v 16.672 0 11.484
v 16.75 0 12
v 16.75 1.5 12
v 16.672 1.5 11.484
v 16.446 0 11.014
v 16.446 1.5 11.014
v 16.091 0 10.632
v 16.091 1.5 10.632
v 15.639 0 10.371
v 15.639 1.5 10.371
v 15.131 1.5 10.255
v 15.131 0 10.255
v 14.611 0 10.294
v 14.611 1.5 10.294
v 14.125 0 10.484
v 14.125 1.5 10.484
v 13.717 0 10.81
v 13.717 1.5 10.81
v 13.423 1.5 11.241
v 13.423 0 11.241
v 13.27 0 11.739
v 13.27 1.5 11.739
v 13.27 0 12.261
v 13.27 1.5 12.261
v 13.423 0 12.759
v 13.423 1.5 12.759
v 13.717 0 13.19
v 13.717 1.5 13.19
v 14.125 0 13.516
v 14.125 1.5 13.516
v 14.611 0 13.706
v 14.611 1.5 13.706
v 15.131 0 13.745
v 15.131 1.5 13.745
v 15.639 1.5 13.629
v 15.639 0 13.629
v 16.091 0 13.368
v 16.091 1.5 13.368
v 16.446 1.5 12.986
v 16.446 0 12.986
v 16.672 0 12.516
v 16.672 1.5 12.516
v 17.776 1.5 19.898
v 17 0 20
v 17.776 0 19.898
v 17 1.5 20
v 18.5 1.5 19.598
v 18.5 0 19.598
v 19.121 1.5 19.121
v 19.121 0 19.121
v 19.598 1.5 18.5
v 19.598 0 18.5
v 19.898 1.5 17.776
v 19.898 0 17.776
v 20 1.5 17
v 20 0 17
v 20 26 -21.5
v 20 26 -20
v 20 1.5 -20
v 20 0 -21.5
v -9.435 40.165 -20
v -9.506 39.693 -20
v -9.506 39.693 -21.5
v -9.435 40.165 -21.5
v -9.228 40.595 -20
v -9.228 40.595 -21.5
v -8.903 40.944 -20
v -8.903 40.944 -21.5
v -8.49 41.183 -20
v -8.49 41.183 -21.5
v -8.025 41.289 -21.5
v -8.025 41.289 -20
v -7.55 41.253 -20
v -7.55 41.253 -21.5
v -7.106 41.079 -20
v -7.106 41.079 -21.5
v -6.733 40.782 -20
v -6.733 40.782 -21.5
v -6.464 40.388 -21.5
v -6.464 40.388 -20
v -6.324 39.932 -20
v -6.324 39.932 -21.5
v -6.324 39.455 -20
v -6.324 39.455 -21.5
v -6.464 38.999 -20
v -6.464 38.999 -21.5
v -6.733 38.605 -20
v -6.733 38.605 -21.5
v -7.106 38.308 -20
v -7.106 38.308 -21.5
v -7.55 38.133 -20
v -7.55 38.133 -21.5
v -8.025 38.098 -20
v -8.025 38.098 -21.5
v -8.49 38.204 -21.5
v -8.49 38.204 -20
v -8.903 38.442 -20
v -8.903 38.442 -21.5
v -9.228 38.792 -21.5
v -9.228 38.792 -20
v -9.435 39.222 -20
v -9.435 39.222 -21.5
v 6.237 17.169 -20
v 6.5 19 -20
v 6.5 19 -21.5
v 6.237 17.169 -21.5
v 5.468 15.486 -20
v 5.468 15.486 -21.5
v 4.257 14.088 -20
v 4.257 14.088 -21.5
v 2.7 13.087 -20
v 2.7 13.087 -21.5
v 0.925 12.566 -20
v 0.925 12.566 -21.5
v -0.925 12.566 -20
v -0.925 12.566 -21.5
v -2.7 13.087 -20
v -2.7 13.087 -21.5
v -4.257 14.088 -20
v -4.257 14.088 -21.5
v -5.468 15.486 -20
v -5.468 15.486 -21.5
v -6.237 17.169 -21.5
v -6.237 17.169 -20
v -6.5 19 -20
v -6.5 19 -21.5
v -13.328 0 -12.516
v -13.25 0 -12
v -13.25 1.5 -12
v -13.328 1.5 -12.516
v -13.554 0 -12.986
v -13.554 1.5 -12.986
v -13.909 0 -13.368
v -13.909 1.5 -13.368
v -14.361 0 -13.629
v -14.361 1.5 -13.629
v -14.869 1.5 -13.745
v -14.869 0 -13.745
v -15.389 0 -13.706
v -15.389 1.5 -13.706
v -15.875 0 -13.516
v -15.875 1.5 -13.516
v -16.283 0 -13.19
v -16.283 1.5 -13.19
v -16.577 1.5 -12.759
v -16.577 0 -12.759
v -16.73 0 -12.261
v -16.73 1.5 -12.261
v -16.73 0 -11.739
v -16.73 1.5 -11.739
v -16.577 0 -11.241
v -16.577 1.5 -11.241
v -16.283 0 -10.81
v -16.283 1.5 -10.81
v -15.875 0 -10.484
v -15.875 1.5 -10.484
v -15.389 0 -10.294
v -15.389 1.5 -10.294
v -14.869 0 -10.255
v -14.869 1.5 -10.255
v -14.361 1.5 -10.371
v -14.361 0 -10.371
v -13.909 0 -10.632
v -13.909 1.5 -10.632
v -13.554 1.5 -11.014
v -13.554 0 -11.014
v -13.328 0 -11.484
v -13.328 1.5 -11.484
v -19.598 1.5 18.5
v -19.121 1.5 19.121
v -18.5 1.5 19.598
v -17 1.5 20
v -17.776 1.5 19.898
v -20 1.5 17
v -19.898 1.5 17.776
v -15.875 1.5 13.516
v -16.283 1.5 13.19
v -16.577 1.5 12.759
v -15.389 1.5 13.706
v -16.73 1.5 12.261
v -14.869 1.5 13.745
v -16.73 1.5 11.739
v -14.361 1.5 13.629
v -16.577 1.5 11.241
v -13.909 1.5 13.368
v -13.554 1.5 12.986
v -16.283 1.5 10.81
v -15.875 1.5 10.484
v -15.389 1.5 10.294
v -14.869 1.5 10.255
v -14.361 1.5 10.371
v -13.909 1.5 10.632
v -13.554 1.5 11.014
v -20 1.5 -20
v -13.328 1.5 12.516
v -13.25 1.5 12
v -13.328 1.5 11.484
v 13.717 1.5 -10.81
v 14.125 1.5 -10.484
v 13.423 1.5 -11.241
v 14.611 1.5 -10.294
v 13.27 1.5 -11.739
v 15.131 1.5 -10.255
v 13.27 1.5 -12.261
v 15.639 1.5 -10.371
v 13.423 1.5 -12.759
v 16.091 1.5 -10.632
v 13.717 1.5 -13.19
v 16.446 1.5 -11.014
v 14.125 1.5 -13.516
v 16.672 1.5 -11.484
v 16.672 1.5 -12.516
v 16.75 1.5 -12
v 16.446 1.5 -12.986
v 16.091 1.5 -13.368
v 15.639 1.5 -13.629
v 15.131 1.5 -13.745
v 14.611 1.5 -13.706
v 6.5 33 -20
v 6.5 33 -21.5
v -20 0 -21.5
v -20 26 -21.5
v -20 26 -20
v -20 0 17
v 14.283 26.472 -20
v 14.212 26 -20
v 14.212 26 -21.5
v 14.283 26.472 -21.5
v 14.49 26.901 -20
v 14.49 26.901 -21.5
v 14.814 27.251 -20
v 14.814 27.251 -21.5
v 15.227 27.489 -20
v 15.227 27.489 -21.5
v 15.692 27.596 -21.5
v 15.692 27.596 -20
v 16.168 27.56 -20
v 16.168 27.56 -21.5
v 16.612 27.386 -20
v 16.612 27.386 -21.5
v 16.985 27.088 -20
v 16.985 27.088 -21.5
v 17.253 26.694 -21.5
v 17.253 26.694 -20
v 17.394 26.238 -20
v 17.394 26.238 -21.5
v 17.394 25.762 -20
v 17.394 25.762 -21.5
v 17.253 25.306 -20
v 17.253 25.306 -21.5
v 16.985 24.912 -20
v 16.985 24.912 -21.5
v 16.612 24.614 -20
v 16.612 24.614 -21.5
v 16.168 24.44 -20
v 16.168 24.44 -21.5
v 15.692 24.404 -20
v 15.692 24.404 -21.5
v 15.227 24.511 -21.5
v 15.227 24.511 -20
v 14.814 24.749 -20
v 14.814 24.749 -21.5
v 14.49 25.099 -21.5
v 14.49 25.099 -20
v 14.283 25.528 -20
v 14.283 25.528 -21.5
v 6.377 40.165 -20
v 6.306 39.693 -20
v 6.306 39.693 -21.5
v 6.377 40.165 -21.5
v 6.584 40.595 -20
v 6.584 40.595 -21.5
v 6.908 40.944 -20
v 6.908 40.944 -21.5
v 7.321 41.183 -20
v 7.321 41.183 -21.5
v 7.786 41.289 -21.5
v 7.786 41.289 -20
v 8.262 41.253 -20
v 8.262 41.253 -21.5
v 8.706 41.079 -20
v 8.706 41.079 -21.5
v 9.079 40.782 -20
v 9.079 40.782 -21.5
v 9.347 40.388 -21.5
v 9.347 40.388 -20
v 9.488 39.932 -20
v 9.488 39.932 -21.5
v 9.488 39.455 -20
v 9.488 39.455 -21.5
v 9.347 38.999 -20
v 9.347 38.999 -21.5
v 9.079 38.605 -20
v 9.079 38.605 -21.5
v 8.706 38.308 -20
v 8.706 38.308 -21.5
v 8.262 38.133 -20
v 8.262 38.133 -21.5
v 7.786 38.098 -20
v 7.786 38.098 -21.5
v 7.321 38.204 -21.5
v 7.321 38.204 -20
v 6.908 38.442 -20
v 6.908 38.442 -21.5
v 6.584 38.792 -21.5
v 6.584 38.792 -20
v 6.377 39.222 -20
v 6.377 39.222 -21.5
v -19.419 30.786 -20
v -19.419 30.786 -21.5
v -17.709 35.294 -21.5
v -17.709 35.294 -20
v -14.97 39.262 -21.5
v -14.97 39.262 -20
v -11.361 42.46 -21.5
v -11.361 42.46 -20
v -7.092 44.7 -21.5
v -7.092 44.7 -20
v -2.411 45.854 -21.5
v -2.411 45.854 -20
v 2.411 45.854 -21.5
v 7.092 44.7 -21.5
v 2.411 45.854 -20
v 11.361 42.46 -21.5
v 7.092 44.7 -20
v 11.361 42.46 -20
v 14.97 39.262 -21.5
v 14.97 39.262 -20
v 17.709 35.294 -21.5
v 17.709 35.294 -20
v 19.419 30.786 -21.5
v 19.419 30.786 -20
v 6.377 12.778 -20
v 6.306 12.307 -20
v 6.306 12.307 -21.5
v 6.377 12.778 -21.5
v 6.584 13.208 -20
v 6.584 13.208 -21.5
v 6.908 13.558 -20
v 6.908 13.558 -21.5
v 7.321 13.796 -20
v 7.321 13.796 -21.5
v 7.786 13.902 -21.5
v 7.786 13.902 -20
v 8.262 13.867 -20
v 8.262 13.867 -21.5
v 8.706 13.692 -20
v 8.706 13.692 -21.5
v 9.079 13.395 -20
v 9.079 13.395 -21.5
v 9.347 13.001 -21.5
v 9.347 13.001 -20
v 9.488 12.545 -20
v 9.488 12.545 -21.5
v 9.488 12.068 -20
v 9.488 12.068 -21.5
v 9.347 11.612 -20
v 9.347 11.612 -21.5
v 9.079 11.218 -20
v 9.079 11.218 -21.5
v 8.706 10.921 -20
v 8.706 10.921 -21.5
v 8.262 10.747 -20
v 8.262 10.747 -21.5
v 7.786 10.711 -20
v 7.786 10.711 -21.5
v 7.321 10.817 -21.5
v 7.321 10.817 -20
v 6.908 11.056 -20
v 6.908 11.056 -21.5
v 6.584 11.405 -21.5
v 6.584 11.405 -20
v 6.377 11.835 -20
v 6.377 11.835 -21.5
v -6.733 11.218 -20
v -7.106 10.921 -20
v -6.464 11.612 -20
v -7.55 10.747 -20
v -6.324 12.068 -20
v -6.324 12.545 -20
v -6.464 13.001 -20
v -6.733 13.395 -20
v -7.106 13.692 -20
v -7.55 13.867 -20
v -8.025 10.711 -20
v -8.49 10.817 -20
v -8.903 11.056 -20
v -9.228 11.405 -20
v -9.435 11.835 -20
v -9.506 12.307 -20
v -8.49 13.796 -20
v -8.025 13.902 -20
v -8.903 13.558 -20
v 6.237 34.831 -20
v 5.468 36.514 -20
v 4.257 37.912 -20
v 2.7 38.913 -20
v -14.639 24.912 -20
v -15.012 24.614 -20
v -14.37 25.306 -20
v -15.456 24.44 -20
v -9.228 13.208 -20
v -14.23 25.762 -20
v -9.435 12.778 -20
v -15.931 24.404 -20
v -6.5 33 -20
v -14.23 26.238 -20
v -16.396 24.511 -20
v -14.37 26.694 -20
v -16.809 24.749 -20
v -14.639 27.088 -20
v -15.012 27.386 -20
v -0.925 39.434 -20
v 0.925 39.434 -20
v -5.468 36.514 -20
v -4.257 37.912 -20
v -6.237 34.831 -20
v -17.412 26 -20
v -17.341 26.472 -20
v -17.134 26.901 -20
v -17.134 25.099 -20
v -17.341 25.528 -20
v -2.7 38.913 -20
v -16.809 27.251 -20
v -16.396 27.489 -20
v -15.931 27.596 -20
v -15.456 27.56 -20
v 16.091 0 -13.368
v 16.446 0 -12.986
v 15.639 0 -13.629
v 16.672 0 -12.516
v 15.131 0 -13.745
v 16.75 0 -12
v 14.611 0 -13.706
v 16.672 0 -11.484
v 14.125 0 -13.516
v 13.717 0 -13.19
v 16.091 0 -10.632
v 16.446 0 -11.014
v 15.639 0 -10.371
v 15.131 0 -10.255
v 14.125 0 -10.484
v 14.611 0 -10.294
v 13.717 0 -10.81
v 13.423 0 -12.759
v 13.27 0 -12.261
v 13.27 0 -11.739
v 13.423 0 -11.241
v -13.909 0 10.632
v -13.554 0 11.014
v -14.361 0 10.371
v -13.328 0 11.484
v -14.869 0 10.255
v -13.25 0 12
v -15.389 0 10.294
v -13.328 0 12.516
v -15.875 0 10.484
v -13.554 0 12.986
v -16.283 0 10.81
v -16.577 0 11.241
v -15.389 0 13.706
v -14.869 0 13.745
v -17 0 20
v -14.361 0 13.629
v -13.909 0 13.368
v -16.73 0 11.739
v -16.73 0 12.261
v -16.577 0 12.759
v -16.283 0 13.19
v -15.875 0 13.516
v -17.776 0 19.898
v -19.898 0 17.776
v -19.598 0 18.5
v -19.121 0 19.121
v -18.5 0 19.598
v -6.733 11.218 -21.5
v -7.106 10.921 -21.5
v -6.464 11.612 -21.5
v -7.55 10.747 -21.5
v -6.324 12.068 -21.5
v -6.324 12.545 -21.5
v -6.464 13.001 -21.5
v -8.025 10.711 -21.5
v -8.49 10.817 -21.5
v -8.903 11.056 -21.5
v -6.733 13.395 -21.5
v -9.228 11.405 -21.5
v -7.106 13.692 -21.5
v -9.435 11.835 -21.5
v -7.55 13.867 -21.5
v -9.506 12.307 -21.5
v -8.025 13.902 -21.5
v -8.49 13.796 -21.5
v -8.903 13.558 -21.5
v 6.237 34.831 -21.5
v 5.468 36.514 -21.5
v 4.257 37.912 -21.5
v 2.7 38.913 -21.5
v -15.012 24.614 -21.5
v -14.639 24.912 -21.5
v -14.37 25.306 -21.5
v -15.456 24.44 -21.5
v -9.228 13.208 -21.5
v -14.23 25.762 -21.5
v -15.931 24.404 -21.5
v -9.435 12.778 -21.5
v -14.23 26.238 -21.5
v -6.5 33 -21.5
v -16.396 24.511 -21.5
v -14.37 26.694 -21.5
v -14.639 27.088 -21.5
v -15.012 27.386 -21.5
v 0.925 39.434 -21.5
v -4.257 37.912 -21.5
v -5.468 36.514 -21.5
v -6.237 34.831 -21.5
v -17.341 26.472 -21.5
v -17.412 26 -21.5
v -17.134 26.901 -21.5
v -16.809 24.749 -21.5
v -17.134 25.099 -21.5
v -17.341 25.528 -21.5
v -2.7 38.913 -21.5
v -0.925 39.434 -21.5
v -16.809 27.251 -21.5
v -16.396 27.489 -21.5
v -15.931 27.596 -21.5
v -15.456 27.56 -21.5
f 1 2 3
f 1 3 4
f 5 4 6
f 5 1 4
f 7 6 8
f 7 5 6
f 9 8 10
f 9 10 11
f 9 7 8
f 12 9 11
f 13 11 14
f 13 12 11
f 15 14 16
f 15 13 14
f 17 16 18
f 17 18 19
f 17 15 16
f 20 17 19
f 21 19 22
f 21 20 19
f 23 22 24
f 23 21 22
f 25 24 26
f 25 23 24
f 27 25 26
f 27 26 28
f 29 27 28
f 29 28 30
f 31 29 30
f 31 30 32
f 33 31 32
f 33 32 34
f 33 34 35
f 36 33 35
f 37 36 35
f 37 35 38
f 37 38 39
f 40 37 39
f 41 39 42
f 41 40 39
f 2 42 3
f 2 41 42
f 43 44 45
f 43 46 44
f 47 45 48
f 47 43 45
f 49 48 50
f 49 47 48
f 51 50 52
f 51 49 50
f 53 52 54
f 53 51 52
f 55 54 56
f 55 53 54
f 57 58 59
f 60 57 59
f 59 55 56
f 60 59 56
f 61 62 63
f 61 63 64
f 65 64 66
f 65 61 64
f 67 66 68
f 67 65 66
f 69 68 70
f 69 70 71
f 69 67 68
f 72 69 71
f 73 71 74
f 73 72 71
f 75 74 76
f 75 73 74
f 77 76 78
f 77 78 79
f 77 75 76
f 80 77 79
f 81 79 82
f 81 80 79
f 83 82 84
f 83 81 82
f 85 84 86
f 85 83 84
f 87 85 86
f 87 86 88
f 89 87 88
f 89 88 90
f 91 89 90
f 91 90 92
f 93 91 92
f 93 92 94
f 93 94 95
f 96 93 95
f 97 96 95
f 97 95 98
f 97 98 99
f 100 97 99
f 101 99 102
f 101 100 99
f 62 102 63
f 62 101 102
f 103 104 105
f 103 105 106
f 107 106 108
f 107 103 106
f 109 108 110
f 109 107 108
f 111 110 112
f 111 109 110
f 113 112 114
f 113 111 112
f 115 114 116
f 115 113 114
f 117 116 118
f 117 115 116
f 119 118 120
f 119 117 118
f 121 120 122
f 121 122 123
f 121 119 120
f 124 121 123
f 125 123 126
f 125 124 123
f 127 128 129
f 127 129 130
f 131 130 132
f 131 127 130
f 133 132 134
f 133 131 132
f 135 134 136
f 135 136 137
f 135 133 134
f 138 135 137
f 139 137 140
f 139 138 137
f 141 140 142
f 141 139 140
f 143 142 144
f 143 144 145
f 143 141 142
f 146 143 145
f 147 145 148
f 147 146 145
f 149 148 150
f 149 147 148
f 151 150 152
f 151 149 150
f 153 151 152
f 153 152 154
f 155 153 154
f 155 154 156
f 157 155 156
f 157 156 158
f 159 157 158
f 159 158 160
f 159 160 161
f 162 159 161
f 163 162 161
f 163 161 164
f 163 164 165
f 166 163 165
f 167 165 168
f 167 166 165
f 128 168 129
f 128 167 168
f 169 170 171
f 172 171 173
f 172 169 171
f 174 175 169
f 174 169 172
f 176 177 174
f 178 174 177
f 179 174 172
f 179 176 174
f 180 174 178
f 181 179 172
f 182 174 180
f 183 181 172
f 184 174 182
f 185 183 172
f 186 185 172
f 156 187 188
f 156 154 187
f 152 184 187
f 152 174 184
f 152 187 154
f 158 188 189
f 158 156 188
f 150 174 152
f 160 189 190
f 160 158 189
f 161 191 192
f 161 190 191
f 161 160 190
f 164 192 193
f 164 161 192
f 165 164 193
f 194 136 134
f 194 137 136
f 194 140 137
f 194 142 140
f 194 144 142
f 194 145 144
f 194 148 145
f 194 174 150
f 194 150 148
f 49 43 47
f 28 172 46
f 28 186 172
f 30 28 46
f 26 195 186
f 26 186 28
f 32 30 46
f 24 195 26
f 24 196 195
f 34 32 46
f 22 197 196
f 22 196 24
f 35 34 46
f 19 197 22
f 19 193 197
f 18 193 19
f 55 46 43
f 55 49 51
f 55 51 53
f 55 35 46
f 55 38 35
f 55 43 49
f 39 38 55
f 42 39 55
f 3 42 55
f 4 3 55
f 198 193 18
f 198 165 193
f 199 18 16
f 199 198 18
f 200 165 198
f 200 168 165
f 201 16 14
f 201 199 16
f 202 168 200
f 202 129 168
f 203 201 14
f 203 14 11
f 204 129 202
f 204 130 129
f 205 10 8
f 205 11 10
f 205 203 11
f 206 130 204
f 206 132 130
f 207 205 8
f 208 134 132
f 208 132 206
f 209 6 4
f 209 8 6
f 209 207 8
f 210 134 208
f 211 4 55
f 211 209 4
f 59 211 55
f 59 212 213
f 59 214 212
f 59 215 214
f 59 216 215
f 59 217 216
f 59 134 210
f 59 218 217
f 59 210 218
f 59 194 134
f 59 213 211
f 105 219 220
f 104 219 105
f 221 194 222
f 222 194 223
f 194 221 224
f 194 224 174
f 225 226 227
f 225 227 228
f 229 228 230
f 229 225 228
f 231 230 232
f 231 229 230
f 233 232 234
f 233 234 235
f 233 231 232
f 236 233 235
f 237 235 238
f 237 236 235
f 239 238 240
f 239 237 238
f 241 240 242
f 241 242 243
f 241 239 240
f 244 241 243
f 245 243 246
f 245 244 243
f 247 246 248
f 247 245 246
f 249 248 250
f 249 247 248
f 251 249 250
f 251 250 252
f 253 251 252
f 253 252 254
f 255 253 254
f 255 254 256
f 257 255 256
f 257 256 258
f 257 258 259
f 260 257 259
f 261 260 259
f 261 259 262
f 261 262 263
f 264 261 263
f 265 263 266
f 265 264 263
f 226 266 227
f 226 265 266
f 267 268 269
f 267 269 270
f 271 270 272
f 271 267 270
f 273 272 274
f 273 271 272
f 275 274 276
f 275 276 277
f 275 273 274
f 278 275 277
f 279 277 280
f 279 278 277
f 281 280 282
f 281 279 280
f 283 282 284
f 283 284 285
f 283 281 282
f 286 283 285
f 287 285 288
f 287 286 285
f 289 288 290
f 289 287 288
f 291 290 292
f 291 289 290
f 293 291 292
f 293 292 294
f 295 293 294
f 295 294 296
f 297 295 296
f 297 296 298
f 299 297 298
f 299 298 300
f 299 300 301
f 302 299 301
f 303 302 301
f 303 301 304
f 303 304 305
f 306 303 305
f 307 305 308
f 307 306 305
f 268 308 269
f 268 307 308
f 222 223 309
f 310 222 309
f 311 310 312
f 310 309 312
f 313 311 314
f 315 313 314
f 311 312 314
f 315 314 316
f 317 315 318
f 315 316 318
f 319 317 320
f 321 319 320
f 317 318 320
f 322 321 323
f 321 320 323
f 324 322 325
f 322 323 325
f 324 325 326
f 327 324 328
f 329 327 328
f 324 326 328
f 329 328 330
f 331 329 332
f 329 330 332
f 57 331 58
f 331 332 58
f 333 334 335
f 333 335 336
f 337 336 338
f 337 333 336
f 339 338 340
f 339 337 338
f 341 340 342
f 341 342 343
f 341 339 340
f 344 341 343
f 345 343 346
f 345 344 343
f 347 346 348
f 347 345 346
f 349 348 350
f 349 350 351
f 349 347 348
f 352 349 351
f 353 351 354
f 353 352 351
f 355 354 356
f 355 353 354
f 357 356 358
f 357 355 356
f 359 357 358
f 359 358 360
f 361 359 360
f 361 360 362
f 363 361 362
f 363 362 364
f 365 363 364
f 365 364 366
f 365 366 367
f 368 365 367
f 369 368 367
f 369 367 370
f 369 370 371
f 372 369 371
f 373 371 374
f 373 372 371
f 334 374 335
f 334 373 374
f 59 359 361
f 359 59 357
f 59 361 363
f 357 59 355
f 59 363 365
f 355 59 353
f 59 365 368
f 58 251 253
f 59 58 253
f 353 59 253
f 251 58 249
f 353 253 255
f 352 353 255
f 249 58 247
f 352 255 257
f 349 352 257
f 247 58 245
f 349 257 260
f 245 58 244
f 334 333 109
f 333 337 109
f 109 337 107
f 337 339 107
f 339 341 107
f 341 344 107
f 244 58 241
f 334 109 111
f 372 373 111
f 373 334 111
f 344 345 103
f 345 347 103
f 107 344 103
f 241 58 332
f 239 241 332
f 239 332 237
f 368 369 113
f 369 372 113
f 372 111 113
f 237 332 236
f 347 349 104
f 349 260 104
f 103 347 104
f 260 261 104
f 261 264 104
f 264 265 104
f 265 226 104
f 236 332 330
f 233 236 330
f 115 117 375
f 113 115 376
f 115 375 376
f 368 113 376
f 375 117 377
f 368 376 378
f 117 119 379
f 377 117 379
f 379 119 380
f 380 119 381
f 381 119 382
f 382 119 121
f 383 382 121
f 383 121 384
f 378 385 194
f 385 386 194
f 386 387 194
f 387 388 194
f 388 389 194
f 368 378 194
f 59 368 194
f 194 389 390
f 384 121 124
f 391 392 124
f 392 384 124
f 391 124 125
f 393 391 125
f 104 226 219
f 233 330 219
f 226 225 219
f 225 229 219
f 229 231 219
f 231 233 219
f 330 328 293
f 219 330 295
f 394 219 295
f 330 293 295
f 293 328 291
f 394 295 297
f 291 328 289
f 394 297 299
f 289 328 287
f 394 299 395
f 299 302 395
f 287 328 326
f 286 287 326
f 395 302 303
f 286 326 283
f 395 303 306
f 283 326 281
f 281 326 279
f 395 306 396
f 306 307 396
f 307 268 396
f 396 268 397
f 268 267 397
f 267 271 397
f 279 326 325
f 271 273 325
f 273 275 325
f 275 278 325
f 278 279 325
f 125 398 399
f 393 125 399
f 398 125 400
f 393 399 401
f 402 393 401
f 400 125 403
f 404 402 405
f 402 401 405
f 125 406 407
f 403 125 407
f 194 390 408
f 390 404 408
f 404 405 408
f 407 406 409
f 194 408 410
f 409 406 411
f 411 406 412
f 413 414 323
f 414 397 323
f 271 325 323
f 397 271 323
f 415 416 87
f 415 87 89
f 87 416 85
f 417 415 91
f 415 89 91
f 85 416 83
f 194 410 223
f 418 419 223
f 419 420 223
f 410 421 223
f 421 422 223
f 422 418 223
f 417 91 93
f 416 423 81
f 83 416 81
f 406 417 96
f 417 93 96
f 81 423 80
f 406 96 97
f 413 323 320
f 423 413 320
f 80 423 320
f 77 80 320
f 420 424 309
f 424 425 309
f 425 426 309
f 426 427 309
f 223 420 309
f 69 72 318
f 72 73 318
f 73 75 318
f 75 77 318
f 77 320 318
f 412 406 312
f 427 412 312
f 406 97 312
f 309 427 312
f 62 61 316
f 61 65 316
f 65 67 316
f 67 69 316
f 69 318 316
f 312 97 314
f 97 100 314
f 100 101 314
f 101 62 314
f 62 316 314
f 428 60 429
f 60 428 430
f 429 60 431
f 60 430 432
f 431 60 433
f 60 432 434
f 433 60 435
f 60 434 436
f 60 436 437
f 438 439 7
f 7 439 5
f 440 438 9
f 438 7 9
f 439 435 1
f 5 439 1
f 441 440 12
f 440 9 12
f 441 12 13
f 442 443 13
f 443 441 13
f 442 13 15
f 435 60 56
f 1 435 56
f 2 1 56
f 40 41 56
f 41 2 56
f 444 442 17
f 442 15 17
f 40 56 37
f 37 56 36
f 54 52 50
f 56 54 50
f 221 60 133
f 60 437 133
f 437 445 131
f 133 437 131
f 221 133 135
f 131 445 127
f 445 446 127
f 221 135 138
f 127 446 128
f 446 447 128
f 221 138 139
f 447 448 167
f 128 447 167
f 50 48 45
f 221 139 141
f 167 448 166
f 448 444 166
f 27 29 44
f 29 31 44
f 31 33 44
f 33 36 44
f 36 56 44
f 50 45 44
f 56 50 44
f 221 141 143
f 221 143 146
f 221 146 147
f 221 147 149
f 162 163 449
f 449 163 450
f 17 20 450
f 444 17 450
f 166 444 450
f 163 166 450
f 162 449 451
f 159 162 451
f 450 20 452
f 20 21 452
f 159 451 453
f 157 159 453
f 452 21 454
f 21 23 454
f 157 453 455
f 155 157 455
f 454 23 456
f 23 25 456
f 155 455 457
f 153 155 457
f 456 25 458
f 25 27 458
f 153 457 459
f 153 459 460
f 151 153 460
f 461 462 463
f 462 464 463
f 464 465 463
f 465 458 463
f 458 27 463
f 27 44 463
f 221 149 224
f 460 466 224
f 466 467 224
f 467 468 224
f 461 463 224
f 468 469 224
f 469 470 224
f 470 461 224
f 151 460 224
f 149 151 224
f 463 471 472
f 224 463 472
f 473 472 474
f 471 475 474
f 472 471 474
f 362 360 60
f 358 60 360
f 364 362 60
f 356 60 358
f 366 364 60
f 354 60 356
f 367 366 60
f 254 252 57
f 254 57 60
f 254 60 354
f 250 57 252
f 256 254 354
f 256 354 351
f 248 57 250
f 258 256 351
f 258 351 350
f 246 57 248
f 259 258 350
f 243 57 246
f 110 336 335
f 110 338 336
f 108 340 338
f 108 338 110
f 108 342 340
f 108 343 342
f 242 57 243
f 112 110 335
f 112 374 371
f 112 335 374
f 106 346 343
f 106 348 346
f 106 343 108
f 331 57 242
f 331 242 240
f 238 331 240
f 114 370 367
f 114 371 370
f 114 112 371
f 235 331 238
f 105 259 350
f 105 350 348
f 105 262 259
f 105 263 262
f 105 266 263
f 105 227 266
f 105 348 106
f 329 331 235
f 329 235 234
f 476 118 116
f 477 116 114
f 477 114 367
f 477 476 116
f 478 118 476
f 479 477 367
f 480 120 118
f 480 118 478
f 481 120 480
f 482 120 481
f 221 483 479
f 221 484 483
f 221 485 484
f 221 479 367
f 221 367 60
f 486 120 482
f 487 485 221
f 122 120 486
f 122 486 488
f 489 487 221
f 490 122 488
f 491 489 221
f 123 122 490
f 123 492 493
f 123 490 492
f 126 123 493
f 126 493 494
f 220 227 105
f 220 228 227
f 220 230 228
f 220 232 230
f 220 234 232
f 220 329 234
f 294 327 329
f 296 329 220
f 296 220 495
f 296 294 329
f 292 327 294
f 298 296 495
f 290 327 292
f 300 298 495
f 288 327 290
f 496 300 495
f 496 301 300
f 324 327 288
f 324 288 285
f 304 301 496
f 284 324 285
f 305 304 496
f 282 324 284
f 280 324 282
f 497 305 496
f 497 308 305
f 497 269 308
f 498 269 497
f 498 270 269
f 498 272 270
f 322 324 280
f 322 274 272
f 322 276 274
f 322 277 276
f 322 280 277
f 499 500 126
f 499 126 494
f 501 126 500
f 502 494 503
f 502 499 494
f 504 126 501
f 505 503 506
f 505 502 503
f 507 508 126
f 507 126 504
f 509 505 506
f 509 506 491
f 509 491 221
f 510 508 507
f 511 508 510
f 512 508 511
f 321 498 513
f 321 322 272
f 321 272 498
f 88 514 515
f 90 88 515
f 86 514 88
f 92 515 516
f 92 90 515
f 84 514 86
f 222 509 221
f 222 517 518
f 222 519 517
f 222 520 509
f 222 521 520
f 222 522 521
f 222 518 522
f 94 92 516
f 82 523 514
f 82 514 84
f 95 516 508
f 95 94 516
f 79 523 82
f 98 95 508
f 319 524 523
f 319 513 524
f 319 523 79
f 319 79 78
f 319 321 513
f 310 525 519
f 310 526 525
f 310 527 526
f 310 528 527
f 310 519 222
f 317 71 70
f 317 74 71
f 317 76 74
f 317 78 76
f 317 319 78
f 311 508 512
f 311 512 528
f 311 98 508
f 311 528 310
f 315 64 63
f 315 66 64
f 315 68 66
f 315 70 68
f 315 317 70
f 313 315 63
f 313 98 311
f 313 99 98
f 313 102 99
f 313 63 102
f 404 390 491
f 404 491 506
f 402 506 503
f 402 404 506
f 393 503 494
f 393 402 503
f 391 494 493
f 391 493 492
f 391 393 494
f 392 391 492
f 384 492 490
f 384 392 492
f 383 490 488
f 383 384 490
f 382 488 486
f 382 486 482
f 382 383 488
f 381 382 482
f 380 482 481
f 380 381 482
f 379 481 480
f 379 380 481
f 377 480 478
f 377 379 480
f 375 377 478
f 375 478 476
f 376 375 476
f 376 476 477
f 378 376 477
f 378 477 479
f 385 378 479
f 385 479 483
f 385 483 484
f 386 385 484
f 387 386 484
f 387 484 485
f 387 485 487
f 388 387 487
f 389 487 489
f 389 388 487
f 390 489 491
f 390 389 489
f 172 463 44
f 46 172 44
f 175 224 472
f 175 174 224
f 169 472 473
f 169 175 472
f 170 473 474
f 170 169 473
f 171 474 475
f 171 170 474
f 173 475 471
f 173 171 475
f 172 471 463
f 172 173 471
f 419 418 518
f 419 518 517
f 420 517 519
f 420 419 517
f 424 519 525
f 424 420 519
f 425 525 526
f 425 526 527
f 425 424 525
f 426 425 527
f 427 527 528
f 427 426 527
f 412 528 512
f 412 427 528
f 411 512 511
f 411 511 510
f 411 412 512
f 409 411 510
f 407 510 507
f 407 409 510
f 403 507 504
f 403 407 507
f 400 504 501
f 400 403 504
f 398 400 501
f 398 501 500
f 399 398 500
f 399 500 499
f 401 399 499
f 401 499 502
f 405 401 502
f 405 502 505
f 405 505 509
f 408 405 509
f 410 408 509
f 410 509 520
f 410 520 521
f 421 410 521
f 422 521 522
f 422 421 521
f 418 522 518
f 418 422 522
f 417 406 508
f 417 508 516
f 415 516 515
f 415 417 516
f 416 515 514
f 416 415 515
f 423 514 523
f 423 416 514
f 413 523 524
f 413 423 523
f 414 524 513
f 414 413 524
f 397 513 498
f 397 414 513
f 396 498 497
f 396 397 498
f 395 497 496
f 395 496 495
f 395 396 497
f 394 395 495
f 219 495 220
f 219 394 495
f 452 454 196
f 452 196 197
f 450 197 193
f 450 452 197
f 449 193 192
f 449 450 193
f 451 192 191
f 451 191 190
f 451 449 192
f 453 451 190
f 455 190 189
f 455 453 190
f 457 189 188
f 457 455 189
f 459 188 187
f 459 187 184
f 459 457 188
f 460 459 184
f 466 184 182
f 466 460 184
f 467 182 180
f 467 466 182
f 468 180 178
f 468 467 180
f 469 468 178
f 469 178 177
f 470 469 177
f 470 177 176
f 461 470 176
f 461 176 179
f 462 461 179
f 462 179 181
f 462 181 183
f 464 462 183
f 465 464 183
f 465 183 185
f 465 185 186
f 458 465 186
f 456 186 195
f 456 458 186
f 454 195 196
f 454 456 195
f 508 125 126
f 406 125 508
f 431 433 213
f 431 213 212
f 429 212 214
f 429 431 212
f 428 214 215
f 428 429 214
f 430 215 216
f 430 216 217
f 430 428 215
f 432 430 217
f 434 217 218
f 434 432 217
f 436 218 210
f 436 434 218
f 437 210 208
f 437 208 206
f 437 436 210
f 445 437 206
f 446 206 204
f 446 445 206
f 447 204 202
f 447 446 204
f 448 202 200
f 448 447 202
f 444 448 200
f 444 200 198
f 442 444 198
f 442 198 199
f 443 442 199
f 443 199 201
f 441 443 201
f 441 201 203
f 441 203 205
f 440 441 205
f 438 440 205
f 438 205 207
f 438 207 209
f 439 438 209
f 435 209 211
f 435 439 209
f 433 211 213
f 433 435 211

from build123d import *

# Parameters (mm, degrees)
SKETCH1_W           = 40
SKETCH1_H           = 40
SKETCH1_R           = 1.75
BOSS_EXTRUDE1_DEPTH = 1.5
FILLET1_R           = 3
SKETCH2_R           = 1.6
BOSS_EXTRUDE2_DEPTH = 1.5


with BuildPart() as part:
    # Sketch1 → Boss-Extrude1 (new body)
    with BuildSketch(Plane(origin=(0, 0, 0), x_dir=(1, 0, 0), z_dir=(0, 1, 0))):
        Rectangle(SKETCH1_W, SKETCH1_H)
        with Locations((-15, -12)):
            Circle(SKETCH1_R, mode=Mode.SUBTRACT)
        with Locations((15, -12)):
            Circle(SKETCH1_R, mode=Mode.SUBTRACT)
        with Locations((15, 12)):
            Circle(SKETCH1_R, mode=Mode.SUBTRACT)
        with Locations((-15, 12)):
            Circle(SKETCH1_R, mode=Mode.SUBTRACT)
    extrude(amount=BOSS_EXTRUDE1_DEPTH)

    # Fillet1
    fillet1_edges = [part.edges().sort_by_distance(p)[0] for p in [
        (20, 0.75, 20),
        (-20, 0.75, 20),
    ]]
    fillet(fillet1_edges, radius=FILLET1_R)

    # Sketch2 → Boss-Extrude2 (add)
    with BuildSketch(Plane(origin=(0, 0, -20), x_dir=(-1, 0, 0), z_dir=(0, 0, -1))):
        with BuildLine():
            Line((-20, 0), (20, 0))
            Line((20, 0), (20, 26))
            ThreePointArc((20, 26), (0, 46), (-20, 26))
            Line((-20, 26), (-20, 0))
        make_face()
        with Locations((15.81171166, 26)):
            Circle(SKETCH2_R, mode=Mode.SUBTRACT)
        with Locations((7.90585583, 12.306656025)):
            Circle(SKETCH2_R, mode=Mode.SUBTRACT)
        with Locations((-7.90585583, 12.306656025)):
            Circle(SKETCH2_R, mode=Mode.SUBTRACT)
        with Locations((-15.81171166, 26)):
            Circle(SKETCH2_R, mode=Mode.SUBTRACT)
        with Locations((-7.90585583, 39.693343975)):
            Circle(SKETCH2_R, mode=Mode.SUBTRACT)
        with Locations((7.90585583, 39.693343975)):
            Circle(SKETCH2_R, mode=Mode.SUBTRACT)
        with BuildLine():
            Line((-6.5, 33), (-6.5, 19))
            ThreePointArc((-6.5, 19), (0, 12.5), (6.5, 19))
            Line((6.5, 19), (6.5, 33))
            ThreePointArc((6.5, 33), (0, 39.5), (-6.5, 33))
        make_face(mode=Mode.SUBTRACT)
    extrude(amount=BOSS_EXTRUDE2_DEPTH)


solid = part.part
